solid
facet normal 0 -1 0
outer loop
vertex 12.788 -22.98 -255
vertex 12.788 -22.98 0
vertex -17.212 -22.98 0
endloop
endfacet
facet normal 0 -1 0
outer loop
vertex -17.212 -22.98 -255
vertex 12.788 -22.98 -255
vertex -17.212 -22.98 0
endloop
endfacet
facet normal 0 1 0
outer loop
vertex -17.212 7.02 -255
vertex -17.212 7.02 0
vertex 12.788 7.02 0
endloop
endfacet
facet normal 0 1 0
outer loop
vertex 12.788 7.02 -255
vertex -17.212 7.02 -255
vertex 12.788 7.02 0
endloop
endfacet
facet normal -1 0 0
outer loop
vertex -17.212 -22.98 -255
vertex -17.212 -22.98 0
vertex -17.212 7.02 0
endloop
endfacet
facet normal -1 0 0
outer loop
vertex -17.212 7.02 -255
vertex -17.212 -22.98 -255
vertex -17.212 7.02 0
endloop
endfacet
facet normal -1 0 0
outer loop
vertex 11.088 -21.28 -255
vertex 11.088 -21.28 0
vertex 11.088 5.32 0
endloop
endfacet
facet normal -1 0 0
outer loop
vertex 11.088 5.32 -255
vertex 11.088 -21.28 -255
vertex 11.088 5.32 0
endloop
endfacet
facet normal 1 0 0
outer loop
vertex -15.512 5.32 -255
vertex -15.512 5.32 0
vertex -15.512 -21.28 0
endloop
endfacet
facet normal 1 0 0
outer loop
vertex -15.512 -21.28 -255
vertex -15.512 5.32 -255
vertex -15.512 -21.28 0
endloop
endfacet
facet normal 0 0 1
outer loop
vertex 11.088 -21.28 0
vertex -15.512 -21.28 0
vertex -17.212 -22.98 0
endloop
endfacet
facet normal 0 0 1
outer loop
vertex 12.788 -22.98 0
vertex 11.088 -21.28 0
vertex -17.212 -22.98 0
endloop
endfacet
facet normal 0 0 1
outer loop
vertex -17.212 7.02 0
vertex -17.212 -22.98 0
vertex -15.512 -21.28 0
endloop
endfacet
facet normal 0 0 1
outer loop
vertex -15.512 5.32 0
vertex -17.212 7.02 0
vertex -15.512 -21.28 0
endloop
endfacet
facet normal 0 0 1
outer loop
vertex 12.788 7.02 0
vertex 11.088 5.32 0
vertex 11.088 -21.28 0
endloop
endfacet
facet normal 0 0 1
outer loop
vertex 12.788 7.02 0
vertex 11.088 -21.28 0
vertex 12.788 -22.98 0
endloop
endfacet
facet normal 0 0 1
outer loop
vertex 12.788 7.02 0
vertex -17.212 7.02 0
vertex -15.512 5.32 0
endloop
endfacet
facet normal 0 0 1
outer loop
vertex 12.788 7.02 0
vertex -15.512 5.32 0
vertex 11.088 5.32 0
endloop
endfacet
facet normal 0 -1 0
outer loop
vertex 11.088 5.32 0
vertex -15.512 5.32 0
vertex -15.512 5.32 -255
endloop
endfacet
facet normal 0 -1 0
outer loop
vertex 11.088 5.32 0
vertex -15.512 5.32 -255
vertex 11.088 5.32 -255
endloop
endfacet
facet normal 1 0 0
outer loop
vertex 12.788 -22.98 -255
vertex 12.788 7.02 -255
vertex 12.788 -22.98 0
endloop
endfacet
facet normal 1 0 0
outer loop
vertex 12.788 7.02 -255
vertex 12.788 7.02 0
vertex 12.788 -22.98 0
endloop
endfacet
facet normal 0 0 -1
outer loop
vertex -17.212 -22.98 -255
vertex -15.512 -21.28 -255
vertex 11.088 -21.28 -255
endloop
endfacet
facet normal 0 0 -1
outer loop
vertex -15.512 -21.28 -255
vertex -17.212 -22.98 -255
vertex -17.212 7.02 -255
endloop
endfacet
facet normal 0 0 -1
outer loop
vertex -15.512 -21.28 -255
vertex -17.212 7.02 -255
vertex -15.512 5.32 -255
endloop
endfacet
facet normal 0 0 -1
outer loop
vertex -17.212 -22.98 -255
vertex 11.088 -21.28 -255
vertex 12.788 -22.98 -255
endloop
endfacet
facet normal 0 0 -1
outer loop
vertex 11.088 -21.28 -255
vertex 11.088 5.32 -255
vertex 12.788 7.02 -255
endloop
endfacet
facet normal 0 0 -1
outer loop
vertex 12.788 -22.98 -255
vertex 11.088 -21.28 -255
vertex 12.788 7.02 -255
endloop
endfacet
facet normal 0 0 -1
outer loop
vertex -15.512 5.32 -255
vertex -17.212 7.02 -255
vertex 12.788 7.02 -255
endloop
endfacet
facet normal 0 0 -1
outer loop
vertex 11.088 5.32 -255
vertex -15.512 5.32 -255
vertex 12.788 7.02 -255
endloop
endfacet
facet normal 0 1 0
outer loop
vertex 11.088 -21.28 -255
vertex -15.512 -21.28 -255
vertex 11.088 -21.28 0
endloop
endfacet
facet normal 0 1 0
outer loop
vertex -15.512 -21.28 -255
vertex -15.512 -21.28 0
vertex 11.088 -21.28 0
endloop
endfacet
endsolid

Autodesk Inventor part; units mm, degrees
ref_plane "YZ Plane" through (0, 0, 0) normal (1, 0, 0) x (0, 1, 0)
ref_plane "XZ Plane" through (0, 0, 0) normal (0, 1, 0) x (-1, 0, 0)
ref_plane "XY Plane" through (0, 0, 0) normal (0, 0, 1) x (1, 0, 0)
sketch "Sketch1" plane through (0, 0, 0) normal (0, 0, 1) x (1, 0, 0)
  line L0 (-17.2121, 7.0196) -> (12.7879, 7.0196)
  line L1 (12.7879, 7.0196) -> (12.7879, -22.9804)
  line L2 (12.7879, -22.9804) -> (-17.2121, -22.9804)
  line L3 (-17.2121, -22.9804) -> (-17.2121, 7.0196)
  line L4 (11.0879, -22.9804) -> (11.0879, 7.0196)
  line L5 (-17.2121, 5.3196) -> (12.7879, 5.3196)
  line L6 (-15.5121, 7.0196) -> (-15.5121, -22.9804)
  line L7 (-17.2121, -21.2804) -> (12.7879, -21.2804)
  point P0 (-15.5121, -21.2804)
  point P1 (11.0879, -21.2804)
  point P2 (11.0879, 5.3196)
  point P3 (-15.5121, 5.3196)
  dimension "d1" = 30
  dimension "d2" = 30
  dimension "d3" = 1.7
  dimension "d4" = 1.7
  dimension "d5" = 1.7
  dimension "d6" = 1.7
extrude "Extrusion1" add sketch "Sketch1" against normal blind 255
extrude "Extrusion2" cut sketch "Sketch1" against normal blind 430 contours L5 L4 L7 L6
properties part number "Cablecanal Ranurado 30x30 L=255 mm" material "PPS Plastic"
